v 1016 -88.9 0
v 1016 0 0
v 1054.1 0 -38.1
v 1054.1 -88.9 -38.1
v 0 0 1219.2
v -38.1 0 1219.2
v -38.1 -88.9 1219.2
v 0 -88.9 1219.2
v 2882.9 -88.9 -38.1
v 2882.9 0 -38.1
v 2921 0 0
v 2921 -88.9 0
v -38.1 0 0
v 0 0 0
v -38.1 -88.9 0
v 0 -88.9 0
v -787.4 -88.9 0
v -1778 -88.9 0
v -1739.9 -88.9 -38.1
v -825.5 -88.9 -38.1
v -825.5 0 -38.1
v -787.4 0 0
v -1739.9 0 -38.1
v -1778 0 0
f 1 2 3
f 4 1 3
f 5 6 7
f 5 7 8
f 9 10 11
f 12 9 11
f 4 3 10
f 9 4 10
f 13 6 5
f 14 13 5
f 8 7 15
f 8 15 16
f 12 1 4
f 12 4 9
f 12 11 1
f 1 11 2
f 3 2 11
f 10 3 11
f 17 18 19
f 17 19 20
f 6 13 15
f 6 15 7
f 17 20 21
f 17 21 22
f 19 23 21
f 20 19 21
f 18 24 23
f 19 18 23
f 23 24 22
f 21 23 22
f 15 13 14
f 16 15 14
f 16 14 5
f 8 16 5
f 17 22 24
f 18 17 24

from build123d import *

# Parameters (mm, degrees)
F1_DEPTH = 88.9
F2_W     = 38.1
F2_H     = 1219.2
F3_DEPTH = 88.9
F5_DEPTH = 88.9


with BuildPart() as f1:
    # F0 (on Front) → F1 (new body)
    with BuildSketch(Plane.XZ):
        Polygon((-787.4, 0), (-1778, 0), (-1739.9, -38.1), (-825.5, -38.1), align=None)
    extrude(amount=F1_DEPTH)


with BuildPart() as f3:
    # F2 (on Front) → F3 (new body)
    with BuildSketch(Plane.XZ):
        with Locations((-19.05, 609.6)):
            Rectangle(F2_W, F2_H)
    extrude(amount=F3_DEPTH)


with BuildPart() as f5:
    # F4 (on Front) → F5 (new body)
    with BuildSketch(Plane.XZ):
        Polygon((2921, 0), (1016, 0), (1054.1, -38.1), (2882.9, -38.1), align=None)
    extrude(amount=F5_DEPTH)


solid = Compound([f1.part, f3.part, f5.part])
